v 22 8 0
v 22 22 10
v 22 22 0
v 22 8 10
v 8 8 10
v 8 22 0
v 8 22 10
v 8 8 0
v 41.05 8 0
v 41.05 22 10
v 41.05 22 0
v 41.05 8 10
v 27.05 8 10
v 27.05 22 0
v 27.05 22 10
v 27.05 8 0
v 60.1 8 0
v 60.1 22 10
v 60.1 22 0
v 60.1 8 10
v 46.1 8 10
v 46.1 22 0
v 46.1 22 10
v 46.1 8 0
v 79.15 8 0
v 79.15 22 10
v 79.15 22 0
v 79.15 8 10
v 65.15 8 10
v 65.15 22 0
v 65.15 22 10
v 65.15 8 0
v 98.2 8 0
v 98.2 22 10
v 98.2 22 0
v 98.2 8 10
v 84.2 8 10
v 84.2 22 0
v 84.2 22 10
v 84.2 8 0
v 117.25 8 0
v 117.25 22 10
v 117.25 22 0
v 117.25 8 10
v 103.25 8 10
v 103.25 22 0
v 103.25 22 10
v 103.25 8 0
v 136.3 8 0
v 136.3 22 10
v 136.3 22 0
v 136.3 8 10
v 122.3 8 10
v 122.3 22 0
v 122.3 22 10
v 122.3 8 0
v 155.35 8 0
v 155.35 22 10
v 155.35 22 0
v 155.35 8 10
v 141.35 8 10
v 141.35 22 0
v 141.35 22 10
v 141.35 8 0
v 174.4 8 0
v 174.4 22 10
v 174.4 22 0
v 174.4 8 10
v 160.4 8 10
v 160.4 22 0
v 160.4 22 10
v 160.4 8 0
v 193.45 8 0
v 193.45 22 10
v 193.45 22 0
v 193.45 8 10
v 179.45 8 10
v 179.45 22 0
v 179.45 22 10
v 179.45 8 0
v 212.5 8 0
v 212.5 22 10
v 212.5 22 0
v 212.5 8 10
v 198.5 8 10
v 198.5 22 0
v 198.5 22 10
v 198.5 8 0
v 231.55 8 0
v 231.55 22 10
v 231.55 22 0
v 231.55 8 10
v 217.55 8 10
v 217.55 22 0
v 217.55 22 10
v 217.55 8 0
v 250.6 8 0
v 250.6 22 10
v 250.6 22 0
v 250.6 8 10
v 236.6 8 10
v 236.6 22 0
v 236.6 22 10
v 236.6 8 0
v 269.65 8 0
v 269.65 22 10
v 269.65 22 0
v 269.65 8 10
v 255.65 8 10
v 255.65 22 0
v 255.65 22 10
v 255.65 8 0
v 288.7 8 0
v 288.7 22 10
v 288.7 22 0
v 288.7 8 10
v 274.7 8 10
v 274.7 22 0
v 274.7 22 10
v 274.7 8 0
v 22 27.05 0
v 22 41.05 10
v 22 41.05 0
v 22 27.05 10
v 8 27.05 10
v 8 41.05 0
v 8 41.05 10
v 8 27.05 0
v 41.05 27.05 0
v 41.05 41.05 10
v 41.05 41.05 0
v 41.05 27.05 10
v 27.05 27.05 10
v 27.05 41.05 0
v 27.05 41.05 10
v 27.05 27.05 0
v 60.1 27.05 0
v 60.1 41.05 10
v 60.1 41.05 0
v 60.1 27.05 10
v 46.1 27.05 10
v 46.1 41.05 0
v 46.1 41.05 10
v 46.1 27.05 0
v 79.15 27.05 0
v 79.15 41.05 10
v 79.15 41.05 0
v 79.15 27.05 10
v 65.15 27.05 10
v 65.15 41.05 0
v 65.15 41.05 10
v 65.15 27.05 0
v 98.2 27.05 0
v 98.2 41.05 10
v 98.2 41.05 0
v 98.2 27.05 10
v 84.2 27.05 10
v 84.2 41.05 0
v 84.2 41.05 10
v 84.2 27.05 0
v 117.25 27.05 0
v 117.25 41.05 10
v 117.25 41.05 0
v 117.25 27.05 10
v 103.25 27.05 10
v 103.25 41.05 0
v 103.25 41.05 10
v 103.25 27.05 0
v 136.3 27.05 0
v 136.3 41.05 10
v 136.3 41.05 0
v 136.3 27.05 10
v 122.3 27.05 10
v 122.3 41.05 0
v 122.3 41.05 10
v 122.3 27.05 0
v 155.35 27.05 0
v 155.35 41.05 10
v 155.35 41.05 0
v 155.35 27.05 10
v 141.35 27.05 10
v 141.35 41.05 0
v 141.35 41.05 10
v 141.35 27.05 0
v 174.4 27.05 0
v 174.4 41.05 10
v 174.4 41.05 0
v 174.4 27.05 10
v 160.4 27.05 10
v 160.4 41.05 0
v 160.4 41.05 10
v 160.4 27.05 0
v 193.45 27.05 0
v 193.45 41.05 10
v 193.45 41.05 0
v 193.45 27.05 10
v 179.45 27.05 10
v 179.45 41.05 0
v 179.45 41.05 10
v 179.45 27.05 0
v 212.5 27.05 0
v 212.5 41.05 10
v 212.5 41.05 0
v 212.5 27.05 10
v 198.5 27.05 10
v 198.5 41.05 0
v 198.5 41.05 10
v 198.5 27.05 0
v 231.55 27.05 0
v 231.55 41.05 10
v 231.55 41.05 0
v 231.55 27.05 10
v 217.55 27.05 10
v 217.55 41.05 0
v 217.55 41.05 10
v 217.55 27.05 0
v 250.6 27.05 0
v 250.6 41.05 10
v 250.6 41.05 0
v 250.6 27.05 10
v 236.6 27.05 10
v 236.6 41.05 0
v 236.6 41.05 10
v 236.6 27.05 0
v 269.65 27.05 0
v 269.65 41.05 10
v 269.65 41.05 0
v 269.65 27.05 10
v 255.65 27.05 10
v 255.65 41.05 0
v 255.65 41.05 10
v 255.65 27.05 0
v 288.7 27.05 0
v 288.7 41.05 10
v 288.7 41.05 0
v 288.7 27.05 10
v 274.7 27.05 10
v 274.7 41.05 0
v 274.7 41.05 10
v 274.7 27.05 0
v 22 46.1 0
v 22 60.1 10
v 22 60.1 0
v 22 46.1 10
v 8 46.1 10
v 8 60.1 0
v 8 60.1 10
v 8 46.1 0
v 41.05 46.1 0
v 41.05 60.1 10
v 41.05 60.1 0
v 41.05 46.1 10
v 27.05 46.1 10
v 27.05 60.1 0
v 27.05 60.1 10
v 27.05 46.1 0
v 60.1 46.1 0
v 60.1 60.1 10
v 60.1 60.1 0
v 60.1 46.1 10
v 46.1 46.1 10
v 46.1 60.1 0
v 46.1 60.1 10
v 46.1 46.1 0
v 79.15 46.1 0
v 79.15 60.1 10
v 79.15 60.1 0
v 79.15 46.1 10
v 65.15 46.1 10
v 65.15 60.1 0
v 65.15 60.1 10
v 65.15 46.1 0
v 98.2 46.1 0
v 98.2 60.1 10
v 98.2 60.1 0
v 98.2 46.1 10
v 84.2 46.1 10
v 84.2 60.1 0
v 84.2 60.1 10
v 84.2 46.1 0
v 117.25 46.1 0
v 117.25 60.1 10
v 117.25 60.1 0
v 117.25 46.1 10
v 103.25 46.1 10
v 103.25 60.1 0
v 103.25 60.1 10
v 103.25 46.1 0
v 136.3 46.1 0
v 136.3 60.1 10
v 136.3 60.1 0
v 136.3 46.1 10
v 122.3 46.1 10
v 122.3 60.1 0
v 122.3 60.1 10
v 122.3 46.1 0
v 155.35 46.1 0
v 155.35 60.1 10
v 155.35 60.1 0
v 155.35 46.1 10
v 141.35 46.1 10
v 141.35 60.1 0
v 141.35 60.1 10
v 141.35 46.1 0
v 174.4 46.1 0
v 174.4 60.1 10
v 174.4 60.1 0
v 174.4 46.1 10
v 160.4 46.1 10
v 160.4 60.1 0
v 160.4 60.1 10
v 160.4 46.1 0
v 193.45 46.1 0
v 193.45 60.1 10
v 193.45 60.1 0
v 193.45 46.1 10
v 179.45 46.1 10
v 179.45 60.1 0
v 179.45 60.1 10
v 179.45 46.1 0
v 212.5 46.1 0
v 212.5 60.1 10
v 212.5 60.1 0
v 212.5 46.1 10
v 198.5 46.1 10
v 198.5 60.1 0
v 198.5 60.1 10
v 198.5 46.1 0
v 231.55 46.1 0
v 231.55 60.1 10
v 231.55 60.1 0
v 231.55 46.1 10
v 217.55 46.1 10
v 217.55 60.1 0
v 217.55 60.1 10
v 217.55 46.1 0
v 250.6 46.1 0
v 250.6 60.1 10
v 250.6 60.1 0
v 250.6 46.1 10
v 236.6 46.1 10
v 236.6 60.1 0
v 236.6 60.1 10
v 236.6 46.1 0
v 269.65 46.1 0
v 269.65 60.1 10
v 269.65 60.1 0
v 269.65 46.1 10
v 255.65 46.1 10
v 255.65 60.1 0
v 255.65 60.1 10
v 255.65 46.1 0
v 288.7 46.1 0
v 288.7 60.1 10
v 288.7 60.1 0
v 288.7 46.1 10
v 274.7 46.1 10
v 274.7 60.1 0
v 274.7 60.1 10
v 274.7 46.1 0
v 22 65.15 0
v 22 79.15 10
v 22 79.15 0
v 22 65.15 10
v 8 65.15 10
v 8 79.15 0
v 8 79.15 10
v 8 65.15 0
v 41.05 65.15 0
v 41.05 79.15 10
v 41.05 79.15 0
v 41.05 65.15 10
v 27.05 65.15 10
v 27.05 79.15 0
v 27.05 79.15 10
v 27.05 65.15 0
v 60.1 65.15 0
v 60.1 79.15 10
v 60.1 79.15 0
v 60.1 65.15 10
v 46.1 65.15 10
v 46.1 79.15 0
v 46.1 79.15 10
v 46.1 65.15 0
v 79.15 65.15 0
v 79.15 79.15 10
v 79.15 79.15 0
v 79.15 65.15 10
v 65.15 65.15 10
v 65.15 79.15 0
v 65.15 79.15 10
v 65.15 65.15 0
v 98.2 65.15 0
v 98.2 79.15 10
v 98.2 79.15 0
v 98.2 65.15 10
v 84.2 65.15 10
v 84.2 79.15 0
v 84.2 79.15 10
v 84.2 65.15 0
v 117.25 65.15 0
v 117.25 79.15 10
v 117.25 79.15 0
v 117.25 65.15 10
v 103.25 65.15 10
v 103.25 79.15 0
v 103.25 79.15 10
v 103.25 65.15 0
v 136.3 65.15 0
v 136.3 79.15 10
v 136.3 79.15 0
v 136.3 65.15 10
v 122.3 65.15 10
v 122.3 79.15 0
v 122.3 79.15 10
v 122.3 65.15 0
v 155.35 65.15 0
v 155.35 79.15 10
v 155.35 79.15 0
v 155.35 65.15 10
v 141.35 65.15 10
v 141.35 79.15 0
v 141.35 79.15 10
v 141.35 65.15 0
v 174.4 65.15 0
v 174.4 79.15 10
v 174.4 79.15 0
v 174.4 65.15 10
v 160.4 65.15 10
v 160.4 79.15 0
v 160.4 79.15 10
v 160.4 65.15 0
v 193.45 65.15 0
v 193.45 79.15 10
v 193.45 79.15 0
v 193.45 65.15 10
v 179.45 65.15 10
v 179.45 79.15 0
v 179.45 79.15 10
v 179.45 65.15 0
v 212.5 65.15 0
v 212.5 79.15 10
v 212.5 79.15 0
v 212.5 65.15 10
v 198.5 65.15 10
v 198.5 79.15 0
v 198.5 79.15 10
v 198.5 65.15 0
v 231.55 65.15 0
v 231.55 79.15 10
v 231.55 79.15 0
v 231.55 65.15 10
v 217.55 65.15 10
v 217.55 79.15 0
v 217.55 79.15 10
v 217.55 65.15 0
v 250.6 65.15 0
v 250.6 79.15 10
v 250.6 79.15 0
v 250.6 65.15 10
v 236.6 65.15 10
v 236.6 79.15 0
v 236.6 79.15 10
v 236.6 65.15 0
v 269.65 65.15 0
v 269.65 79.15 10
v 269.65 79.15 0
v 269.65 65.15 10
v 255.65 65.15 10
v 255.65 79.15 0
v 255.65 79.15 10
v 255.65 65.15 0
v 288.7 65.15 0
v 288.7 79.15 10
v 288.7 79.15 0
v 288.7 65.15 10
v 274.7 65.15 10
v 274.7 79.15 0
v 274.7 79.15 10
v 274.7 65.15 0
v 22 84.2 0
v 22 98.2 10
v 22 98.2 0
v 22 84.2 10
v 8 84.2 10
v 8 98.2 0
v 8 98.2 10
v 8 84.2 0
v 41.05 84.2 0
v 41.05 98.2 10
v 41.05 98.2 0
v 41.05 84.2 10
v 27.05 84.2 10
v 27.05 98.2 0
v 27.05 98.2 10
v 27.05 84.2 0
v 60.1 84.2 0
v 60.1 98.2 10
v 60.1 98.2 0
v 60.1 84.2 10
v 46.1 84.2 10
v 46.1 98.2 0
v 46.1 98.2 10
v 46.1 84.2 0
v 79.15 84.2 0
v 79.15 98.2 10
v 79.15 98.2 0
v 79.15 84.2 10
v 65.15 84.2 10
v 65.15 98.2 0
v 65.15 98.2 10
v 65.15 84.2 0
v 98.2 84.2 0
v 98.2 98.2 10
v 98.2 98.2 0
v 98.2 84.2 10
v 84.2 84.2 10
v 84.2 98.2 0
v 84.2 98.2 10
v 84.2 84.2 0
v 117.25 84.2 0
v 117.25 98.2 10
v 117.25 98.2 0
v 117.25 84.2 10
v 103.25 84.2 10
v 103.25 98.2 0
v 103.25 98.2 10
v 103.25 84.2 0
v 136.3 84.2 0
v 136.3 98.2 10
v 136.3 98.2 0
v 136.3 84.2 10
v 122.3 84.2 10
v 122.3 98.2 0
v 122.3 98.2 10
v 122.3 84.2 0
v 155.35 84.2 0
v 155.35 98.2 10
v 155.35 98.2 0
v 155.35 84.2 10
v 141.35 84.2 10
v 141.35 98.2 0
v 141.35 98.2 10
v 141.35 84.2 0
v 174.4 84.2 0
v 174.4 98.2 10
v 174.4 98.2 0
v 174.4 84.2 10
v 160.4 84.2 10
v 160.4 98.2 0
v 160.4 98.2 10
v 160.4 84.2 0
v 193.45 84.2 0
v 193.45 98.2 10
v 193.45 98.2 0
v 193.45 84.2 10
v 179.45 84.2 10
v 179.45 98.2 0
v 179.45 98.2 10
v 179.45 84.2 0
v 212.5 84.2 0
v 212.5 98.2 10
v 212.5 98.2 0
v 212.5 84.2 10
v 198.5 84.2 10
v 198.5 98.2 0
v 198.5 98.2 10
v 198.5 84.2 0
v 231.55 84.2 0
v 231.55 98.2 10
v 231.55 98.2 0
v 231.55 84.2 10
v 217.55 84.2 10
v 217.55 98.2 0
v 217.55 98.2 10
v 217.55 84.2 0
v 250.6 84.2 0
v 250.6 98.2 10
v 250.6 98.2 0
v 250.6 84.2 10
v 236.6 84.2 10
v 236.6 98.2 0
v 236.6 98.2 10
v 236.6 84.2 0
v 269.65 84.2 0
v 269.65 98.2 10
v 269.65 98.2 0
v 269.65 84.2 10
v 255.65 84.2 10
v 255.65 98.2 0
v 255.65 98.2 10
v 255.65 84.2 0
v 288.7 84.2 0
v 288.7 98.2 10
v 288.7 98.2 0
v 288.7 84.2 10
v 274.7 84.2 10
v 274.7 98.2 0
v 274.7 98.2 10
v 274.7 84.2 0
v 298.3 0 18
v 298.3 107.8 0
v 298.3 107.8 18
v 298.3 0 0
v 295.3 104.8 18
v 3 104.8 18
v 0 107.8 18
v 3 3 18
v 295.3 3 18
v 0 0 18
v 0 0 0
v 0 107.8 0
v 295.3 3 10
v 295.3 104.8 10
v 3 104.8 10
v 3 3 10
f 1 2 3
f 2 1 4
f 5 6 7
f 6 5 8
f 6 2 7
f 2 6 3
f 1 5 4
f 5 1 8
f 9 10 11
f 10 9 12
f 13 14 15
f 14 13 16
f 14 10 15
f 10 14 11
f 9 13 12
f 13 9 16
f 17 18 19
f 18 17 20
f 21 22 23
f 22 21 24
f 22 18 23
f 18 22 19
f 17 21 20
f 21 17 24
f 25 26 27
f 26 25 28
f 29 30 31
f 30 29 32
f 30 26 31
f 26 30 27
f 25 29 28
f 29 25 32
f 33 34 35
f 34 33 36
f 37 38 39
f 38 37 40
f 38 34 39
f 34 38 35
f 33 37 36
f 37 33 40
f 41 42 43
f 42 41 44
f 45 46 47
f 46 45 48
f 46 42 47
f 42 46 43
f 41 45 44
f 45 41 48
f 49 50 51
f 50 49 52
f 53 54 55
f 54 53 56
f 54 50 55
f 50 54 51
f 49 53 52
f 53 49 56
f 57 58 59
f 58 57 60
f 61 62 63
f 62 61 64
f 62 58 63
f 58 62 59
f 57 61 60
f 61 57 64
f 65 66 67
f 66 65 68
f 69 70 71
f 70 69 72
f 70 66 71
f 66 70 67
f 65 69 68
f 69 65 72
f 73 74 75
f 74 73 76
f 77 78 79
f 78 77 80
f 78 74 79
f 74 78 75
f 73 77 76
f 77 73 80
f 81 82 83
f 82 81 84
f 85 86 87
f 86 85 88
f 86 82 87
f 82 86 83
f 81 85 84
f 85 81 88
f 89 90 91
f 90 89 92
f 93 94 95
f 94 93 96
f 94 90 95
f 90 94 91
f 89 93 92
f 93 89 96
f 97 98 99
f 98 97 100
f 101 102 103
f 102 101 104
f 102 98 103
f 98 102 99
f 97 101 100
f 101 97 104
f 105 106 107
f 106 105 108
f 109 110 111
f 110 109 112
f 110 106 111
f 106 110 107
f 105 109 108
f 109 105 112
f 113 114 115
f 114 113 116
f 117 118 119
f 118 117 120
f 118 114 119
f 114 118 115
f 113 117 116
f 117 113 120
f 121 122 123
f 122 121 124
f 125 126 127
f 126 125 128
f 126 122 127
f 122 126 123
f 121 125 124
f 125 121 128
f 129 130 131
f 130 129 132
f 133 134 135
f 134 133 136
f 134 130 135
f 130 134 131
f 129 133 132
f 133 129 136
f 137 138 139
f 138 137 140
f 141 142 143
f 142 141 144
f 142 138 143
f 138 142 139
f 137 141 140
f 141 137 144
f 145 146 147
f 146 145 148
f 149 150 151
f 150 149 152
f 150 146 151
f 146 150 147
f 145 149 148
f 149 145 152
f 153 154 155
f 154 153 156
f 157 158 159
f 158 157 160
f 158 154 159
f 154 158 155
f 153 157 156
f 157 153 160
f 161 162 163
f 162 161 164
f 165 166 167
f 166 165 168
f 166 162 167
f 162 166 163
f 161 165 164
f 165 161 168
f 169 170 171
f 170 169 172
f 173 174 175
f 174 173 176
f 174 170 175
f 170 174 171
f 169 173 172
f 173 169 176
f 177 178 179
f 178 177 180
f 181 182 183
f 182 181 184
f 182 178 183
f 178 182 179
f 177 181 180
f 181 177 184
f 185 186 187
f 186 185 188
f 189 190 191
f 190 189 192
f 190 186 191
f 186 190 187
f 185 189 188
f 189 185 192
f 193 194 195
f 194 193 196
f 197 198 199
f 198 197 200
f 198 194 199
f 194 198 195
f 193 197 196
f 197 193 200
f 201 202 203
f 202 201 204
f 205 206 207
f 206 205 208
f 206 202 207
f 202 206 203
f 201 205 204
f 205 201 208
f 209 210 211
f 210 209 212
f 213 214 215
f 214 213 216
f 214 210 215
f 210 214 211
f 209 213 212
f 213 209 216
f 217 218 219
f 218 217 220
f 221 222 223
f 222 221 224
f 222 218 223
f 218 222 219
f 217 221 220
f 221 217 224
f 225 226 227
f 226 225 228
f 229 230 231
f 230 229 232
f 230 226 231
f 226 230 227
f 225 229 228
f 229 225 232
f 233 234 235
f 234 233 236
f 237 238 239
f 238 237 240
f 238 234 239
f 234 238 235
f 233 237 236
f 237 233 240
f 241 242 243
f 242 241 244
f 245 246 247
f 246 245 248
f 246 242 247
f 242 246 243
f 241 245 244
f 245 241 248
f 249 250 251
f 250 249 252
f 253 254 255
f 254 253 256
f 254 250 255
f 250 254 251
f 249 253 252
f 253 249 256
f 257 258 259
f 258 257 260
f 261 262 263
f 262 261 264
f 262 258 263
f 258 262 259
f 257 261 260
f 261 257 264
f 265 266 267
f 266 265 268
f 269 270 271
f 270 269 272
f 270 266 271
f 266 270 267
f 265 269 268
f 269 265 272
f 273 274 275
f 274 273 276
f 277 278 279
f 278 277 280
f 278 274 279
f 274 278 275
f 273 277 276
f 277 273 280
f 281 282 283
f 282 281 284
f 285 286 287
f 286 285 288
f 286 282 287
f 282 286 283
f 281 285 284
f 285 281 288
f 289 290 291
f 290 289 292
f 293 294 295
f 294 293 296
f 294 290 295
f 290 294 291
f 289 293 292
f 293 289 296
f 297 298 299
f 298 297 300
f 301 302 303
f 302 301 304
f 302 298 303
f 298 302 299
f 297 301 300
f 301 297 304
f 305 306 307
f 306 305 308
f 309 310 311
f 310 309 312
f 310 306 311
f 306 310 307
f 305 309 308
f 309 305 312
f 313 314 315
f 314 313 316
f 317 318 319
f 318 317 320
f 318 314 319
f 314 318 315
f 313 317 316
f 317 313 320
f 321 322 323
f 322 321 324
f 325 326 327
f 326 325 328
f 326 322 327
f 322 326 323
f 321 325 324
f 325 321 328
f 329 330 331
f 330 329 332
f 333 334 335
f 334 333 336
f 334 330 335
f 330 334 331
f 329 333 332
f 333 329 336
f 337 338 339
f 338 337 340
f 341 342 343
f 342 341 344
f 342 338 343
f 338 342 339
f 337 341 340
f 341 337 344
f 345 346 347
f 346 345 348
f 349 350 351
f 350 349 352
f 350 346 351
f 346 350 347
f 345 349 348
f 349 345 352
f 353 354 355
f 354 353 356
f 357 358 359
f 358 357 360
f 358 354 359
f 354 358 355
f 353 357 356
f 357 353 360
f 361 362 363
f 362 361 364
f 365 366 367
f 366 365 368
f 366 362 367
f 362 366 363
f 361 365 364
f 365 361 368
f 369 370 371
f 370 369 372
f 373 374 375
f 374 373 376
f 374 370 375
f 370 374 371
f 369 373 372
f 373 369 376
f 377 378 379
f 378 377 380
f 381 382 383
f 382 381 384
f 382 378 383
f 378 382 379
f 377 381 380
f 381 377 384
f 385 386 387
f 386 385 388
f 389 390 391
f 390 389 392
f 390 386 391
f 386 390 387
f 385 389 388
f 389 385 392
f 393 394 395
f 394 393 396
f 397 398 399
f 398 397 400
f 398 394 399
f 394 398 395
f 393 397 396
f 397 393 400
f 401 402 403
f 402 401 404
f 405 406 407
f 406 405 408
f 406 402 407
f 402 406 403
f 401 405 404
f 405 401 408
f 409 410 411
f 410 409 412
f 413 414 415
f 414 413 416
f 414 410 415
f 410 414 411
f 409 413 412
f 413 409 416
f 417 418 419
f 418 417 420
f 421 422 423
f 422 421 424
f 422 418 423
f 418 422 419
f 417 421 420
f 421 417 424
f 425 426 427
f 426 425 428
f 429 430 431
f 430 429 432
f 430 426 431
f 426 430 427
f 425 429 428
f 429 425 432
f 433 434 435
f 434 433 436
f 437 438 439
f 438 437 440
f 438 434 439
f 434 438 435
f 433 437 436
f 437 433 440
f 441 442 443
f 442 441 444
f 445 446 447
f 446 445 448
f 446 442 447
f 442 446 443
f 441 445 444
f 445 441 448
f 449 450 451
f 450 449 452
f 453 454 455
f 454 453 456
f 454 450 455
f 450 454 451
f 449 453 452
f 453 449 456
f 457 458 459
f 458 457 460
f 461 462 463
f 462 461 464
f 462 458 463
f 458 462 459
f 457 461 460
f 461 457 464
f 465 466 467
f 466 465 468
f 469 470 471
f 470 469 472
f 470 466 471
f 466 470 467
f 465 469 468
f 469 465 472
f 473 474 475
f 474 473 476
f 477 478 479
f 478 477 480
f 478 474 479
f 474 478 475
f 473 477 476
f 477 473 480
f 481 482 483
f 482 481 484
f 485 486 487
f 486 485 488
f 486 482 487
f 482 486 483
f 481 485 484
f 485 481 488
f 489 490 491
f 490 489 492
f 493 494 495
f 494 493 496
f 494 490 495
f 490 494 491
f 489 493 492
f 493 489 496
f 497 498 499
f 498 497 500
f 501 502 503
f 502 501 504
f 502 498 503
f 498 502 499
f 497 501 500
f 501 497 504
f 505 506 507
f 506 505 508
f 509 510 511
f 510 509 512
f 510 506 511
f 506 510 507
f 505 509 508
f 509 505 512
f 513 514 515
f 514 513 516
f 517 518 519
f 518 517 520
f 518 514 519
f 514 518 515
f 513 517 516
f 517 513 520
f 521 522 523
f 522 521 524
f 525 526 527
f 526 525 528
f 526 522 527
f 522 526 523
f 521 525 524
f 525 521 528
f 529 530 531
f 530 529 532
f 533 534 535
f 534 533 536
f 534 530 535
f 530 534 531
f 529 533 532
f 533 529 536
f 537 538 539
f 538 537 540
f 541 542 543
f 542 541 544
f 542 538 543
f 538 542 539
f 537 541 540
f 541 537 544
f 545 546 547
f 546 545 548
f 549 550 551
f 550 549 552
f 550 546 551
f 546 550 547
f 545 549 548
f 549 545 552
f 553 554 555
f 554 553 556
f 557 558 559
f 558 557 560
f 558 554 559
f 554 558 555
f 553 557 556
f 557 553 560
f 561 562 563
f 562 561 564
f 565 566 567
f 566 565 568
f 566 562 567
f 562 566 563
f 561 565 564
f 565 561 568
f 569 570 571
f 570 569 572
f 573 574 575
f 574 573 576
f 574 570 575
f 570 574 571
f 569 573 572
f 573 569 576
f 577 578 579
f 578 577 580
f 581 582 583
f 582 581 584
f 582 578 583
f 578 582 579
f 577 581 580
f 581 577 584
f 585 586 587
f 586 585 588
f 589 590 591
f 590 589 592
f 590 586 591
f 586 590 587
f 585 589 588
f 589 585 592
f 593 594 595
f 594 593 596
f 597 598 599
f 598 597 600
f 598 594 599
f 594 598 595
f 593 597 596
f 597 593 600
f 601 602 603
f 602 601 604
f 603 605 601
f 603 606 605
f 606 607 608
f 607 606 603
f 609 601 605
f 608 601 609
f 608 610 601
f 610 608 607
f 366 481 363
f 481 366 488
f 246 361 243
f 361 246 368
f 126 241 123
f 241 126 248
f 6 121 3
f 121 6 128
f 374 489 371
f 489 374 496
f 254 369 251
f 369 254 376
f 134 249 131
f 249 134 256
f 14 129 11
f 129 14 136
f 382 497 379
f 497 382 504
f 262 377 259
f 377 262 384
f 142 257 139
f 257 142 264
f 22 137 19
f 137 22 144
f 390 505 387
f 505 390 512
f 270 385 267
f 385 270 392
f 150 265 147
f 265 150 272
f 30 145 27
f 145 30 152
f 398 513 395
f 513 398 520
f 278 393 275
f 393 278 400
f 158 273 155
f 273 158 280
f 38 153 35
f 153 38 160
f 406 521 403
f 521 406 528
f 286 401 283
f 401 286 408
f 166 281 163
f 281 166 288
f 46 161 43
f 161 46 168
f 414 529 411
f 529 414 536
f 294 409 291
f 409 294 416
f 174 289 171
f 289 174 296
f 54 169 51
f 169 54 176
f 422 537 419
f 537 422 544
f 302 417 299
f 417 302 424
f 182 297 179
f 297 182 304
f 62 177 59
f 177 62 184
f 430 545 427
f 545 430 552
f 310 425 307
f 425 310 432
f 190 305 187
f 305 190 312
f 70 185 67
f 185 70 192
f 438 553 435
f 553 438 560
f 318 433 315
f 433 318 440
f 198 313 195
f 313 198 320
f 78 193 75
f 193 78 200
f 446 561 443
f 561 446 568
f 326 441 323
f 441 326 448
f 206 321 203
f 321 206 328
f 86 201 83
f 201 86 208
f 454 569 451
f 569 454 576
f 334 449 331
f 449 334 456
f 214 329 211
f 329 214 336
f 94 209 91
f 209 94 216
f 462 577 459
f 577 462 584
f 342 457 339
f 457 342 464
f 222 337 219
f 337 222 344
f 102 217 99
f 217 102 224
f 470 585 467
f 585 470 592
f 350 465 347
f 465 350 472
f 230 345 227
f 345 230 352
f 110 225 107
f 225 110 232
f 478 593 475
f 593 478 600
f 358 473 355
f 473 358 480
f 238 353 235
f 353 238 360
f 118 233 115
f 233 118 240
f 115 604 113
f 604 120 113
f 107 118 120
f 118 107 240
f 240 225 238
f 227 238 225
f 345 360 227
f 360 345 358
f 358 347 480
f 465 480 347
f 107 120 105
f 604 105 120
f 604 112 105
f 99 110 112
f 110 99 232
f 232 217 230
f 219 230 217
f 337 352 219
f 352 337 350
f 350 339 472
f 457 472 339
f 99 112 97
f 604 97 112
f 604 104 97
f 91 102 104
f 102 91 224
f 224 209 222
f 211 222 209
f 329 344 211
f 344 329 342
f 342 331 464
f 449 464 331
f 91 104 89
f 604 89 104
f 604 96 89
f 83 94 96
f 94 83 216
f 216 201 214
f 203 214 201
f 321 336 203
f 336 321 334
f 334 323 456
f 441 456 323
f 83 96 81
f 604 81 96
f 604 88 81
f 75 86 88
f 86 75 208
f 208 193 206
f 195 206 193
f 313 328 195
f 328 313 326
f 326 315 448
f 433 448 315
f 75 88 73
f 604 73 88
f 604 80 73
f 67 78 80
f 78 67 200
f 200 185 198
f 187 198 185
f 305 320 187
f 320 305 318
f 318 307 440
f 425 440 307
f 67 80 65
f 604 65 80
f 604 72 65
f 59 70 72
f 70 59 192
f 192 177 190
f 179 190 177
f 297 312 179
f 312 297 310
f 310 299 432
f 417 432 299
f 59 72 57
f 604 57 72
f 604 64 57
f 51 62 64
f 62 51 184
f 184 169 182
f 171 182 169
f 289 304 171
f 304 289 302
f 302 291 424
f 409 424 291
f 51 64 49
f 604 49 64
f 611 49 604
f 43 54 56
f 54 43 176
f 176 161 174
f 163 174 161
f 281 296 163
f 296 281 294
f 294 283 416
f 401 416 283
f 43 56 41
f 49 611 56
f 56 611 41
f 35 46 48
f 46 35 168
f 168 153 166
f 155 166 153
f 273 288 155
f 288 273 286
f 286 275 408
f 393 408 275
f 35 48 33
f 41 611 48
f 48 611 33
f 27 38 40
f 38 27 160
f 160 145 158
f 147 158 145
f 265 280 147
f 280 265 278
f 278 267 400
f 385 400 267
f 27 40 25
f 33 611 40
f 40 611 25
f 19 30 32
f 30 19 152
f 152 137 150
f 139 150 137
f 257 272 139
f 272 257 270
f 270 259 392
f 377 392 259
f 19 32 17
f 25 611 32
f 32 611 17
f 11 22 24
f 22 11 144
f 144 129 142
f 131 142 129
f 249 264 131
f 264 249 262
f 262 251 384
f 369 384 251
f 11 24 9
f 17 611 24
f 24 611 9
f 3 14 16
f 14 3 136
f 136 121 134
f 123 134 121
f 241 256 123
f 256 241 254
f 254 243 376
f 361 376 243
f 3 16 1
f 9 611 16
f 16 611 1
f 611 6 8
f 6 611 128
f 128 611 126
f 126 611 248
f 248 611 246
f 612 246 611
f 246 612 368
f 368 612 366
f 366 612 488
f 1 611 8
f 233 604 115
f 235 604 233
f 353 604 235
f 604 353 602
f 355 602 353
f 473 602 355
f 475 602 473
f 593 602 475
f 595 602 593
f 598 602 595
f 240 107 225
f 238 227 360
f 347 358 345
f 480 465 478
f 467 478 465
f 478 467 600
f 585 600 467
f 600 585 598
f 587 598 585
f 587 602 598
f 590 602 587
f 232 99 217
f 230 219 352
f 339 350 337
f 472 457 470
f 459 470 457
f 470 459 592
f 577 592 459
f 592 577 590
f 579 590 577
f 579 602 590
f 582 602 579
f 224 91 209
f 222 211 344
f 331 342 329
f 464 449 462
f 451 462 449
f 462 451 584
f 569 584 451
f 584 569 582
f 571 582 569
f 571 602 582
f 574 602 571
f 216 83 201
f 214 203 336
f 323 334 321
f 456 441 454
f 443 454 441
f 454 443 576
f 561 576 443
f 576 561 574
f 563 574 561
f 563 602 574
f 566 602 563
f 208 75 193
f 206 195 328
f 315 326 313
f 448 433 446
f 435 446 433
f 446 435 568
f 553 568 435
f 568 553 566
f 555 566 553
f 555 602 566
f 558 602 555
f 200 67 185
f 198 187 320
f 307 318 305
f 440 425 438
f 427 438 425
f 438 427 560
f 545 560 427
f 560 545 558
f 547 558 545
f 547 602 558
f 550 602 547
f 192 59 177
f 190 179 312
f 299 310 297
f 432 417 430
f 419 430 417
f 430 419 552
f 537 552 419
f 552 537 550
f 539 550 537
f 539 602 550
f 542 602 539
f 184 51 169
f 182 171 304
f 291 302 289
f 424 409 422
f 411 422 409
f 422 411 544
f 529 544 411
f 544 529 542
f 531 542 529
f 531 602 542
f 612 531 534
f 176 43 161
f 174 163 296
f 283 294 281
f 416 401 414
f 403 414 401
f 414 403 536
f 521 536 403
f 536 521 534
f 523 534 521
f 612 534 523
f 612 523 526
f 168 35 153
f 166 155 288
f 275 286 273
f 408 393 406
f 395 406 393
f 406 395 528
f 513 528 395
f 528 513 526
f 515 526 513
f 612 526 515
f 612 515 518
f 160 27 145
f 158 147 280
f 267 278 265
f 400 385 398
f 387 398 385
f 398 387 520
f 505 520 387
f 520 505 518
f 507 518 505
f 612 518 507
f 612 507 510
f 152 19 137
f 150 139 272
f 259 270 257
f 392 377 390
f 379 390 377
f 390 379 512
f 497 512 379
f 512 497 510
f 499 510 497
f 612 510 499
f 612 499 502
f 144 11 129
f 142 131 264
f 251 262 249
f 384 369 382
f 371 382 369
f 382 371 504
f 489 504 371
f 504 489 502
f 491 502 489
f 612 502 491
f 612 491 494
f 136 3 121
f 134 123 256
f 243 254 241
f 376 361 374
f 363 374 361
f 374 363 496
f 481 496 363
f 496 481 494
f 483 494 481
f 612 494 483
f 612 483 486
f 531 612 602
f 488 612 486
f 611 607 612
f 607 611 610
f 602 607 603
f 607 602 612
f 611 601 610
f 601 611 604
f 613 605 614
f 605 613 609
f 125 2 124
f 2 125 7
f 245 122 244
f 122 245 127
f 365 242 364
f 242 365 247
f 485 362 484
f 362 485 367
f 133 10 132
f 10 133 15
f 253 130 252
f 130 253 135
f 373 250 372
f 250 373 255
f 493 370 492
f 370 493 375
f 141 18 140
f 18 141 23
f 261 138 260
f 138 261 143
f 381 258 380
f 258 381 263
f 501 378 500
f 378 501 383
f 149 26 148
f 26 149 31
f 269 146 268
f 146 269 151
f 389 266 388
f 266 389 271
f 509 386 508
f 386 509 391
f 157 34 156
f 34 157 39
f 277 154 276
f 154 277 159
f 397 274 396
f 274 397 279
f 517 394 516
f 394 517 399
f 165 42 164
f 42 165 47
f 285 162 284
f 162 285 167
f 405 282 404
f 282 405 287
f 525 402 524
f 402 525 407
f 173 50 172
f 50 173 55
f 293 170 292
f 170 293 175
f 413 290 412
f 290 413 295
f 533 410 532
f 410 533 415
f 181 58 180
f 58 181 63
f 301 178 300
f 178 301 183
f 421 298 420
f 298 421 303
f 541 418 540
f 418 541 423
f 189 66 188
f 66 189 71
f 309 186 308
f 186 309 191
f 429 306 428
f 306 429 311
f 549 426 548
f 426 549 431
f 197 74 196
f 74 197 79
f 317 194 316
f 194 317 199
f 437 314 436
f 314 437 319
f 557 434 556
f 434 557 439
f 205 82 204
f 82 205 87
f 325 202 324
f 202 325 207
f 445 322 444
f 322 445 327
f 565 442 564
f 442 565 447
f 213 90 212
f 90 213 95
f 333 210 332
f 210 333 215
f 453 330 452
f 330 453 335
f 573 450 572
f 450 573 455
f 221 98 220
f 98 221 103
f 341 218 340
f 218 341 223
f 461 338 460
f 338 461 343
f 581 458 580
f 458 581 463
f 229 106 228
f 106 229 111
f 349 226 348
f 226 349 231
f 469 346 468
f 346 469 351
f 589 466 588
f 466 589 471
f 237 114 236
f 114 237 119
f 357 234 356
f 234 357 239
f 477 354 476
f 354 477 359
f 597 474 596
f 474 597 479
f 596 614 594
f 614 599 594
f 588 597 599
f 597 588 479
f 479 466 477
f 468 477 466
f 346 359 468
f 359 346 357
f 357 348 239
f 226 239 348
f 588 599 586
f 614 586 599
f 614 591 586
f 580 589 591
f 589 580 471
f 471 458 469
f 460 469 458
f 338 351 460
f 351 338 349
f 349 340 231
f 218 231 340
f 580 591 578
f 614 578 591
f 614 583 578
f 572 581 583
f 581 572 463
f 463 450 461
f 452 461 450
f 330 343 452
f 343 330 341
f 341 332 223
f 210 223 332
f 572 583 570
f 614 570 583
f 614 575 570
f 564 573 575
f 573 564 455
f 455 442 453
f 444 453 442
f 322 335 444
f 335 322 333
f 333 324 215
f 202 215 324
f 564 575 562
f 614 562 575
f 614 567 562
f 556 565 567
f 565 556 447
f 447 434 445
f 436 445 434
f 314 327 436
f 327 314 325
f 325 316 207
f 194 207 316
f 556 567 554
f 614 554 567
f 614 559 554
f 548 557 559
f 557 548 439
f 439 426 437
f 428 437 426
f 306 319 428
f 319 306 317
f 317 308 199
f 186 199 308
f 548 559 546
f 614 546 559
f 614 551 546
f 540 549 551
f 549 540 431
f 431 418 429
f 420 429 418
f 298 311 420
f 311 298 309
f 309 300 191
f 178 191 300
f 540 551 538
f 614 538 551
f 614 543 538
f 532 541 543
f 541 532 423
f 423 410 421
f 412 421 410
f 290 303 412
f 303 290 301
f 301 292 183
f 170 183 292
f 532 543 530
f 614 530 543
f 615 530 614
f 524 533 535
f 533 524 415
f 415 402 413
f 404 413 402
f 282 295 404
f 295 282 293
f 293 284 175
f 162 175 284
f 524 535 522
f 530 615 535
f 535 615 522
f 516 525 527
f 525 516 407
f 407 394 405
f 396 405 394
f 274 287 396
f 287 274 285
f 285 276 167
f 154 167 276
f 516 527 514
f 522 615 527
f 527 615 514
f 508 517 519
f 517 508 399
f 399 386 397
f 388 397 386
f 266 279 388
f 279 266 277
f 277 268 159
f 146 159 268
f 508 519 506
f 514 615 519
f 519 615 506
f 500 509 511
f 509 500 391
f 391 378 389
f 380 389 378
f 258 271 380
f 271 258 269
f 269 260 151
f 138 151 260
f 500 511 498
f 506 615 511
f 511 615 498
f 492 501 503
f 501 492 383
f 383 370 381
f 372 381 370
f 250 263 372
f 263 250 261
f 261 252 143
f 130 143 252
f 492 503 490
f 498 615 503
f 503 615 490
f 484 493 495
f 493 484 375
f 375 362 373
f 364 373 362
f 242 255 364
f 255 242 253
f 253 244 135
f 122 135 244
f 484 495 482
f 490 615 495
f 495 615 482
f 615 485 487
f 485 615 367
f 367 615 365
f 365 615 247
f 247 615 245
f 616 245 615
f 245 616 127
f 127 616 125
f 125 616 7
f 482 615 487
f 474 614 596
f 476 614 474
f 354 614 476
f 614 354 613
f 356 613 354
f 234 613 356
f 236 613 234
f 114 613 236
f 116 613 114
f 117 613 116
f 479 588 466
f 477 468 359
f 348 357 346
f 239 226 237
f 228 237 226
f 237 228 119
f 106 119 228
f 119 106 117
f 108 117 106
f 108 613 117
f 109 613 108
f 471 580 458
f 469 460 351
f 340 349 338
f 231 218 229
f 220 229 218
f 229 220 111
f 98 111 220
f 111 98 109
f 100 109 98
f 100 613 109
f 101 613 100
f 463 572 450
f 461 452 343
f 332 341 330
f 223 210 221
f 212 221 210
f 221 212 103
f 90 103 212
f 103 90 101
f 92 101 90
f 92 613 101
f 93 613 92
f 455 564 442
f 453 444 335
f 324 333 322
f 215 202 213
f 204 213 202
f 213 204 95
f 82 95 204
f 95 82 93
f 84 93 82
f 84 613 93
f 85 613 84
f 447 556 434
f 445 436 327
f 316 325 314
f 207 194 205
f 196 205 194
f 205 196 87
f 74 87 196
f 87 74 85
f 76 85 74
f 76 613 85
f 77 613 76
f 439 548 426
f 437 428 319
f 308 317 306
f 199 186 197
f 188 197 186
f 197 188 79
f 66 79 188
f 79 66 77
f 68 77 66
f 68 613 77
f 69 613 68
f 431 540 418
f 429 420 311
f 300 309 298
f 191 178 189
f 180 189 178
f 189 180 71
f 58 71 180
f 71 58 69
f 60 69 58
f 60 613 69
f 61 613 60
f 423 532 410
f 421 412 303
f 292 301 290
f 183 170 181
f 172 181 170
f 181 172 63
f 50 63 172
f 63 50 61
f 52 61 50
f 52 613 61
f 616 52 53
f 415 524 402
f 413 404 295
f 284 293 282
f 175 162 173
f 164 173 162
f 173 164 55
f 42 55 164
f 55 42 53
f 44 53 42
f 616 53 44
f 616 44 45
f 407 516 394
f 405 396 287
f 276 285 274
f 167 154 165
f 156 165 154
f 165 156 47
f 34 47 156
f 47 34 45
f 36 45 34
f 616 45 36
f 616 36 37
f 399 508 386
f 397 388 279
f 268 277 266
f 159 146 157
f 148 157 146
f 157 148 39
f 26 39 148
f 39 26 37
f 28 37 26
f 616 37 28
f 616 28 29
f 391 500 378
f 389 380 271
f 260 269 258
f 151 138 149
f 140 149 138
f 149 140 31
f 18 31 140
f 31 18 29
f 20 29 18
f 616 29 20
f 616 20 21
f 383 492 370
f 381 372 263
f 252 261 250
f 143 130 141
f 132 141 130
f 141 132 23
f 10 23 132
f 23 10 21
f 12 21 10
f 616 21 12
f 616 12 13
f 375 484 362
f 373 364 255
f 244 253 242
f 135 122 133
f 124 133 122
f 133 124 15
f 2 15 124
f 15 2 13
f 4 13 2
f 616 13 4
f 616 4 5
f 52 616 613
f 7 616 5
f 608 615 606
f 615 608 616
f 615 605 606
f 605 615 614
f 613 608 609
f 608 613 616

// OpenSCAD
// Generated keyboard case
// Layout: 5x15
// Switch type: Cherry MX

// Parameters
case_width = 298.30;
case_height = 107.80;
case_depth = 18.00;
wall_thickness = 3.00;
base_height = 10.00;
switch_cutout_size = 14.00;
key_spacing = 19.05;

module keyboard_case() {
    difference() {
        // Outer shell
        translate([0, 0, 0])
            cube([case_width, case_height, case_depth]);

        // Inner cavity
        translate([wall_thickness, wall_thickness, base_height])
            cube([case_width - 2*wall_thickness, 
                  case_height - 2*wall_thickness, 
                  case_depth - base_height + 1]);

        // Switch cutouts
        translate([wall_thickness + 5 - 0.00, wall_thickness + 5 - 0.00, -1])
            switch_plate();
    }
}

module switch_plate() {
    translate([0.00, 0.00, 0])
        cube([switch_cutout_size, switch_cutout_size, base_height + 2]);
    translate([19.05, 0.00, 0])
        cube([switch_cutout_size, switch_cutout_size, base_height + 2]);
    translate([38.10, 0.00, 0])
        cube([switch_cutout_size, switch_cutout_size, base_height + 2]);
    translate([57.15, 0.00, 0])
        cube([switch_cutout_size, switch_cutout_size, base_height + 2]);
    translate([76.20, 0.00, 0])
        cube([switch_cutout_size, switch_cutout_size, base_height + 2]);
    translate([95.25, 0.00, 0])
        cube([switch_cutout_size, switch_cutout_size, base_height + 2]);
    translate([114.30, 0.00, 0])
        cube([switch_cutout_size, switch_cutout_size, base_height + 2]);
    translate([133.35, 0.00, 0])
        cube([switch_cutout_size, switch_cutout_size, base_height + 2]);
    translate([152.40, 0.00, 0])
        cube([switch_cutout_size, switch_cutout_size, base_height + 2]);
    translate([171.45, 0.00, 0])
        cube([switch_cutout_size, switch_cutout_size, base_height + 2]);
    translate([190.50, 0.00, 0])
        cube([switch_cutout_size, switch_cutout_size, base_height + 2]);
    translate([209.55, 0.00, 0])
        cube([switch_cutout_size, switch_cutout_size, base_height + 2]);
    translate([228.60, 0.00, 0])
        cube([switch_cutout_size, switch_cutout_size, base_height + 2]);
    translate([247.65, 0.00, 0])
        cube([switch_cutout_size, switch_cutout_size, base_height + 2]);
    translate([266.70, 0.00, 0])
        cube([switch_cutout_size, switch_cutout_size, base_height + 2]);
    translate([0.00, 19.05, 0])
        cube([switch_cutout_size, switch_cutout_size, base_height + 2]);
    translate([19.05, 19.05, 0])
        cube([switch_cutout_size, switch_cutout_size, base_height + 2]);
    translate([38.10, 19.05, 0])
        cube([switch_cutout_size, switch_cutout_size, base_height + 2]);
    translate([57.15, 19.05, 0])
        cube([switch_cutout_size, switch_cutout_size, base_height + 2]);
    translate([76.20, 19.05, 0])
        cube([switch_cutout_size, switch_cutout_size, base_height + 2]);
    translate([95.25, 19.05, 0])
        cube([switch_cutout_size, switch_cutout_size, base_height + 2]);
    translate([114.30, 19.05, 0])
        cube([switch_cutout_size, switch_cutout_size, base_height + 2]);
    translate([133.35, 19.05, 0])
        cube([switch_cutout_size, switch_cutout_size, base_height + 2]);
    translate([152.40, 19.05, 0])
        cube([switch_cutout_size, switch_cutout_size, base_height + 2]);
    translate([171.45, 19.05, 0])
        cube([switch_cutout_size, switch_cutout_size, base_height + 2]);
    translate([190.50, 19.05, 0])
        cube([switch_cutout_size, switch_cutout_size, base_height + 2]);
    translate([209.55, 19.05, 0])
        cube([switch_cutout_size, switch_cutout_size, base_height + 2]);
    translate([228.60, 19.05, 0])
        cube([switch_cutout_size, switch_cutout_size, base_height + 2]);
    translate([247.65, 19.05, 0])
        cube([switch_cutout_size, switch_cutout_size, base_height + 2]);
    translate([266.70, 19.05, 0])
        cube([switch_cutout_size, switch_cutout_size, base_height + 2]);
    translate([0.00, 38.10, 0])
        cube([switch_cutout_size, switch_cutout_size, base_height + 2]);
    translate([19.05, 38.10, 0])
        cube([switch_cutout_size, switch_cutout_size, base_height + 2]);
    translate([38.10, 38.10, 0])
        cube([switch_cutout_size, switch_cutout_size, base_height + 2]);
    translate([57.15, 38.10, 0])
        cube([switch_cutout_size, switch_cutout_size, base_height + 2]);
    translate([76.20, 38.10, 0])
        cube([switch_cutout_size, switch_cutout_size, base_height + 2]);
    translate([95.25, 38.10, 0])
        cube([switch_cutout_size, switch_cutout_size, base_height + 2]);
    translate([114.30, 38.10, 0])
        cube([switch_cutout_size, switch_cutout_size, base_height + 2]);
    translate([133.35, 38.10, 0])
        cube([switch_cutout_size, switch_cutout_size, base_height + 2]);
    translate([152.40, 38.10, 0])
        cube([switch_cutout_size, switch_cutout_size, base_height + 2]);
    translate([171.45, 38.10, 0])
        cube([switch_cutout_size, switch_cutout_size, base_height + 2]);
    translate([190.50, 38.10, 0])
        cube([switch_cutout_size, switch_cutout_size, base_height + 2]);
    translate([209.55, 38.10, 0])
        cube([switch_cutout_size, switch_cutout_size, base_height + 2]);
    translate([228.60, 38.10, 0])
        cube([switch_cutout_size, switch_cutout_size, base_height + 2]);
    translate([247.65, 38.10, 0])
        cube([switch_cutout_size, switch_cutout_size, base_height + 2]);
    translate([266.70, 38.10, 0])
        cube([switch_cutout_size, switch_cutout_size, base_height + 2]);
    translate([0.00, 57.15, 0])
        cube([switch_cutout_size, switch_cutout_size, base_height + 2]);
    translate([19.05, 57.15, 0])
        cube([switch_cutout_size, switch_cutout_size, base_height + 2]);
    translate([38.10, 57.15, 0])
        cube([switch_cutout_size, switch_cutout_size, base_height + 2]);
    translate([57.15, 57.15, 0])
        cube([switch_cutout_size, switch_cutout_size, base_height + 2]);
    translate([76.20, 57.15, 0])
        cube([switch_cutout_size, switch_cutout_size, base_height + 2]);
    translate([95.25, 57.15, 0])
        cube([switch_cutout_size, switch_cutout_size, base_height + 2]);
    translate([114.30, 57.15, 0])
        cube([switch_cutout_size, switch_cutout_size, base_height + 2]);
    translate([133.35, 57.15, 0])
        cube([switch_cutout_size, switch_cutout_size, base_height + 2]);
    translate([152.40, 57.15, 0])
        cube([switch_cutout_size, switch_cutout_size, base_height + 2]);
    translate([171.45, 57.15, 0])
        cube([switch_cutout_size, switch_cutout_size, base_height + 2]);
    translate([190.50, 57.15, 0])
        cube([switch_cutout_size, switch_cutout_size, base_height + 2]);
    translate([209.55, 57.15, 0])
        cube([switch_cutout_size, switch_cutout_size, base_height + 2]);
    translate([228.60, 57.15, 0])
        cube([switch_cutout_size, switch_cutout_size, base_height + 2]);
    translate([247.65, 57.15, 0])
        cube([switch_cutout_size, switch_cutout_size, base_height + 2]);
    translate([266.70, 57.15, 0])
        cube([switch_cutout_size, switch_cutout_size, base_height + 2]);
    translate([0.00, 76.20, 0])
        cube([switch_cutout_size, switch_cutout_size, base_height + 2]);
    translate([19.05, 76.20, 0])
        cube([switch_cutout_size, switch_cutout_size, base_height + 2]);
    translate([38.10, 76.20, 0])
        cube([switch_cutout_size, switch_cutout_size, base_height + 2]);
    translate([57.15, 76.20, 0])
        cube([switch_cutout_size, switch_cutout_size, base_height + 2]);
    translate([76.20, 76.20, 0])
        cube([switch_cutout_size, switch_cutout_size, base_height + 2]);
    translate([95.25, 76.20, 0])
        cube([switch_cutout_size, switch_cutout_size, base_height + 2]);
    translate([114.30, 76.20, 0])
        cube([switch_cutout_size, switch_cutout_size, base_height + 2]);
    translate([133.35, 76.20, 0])
        cube([switch_cutout_size, switch_cutout_size, base_height + 2]);
    translate([152.40, 76.20, 0])
        cube([switch_cutout_size, switch_cutout_size, base_height + 2]);
    translate([171.45, 76.20, 0])
        cube([switch_cutout_size, switch_cutout_size, base_height + 2]);
    translate([190.50, 76.20, 0])
        cube([switch_cutout_size, switch_cutout_size, base_height + 2]);
    translate([209.55, 76.20, 0])
        cube([switch_cutout_size, switch_cutout_size, base_height + 2]);
    translate([228.60, 76.20, 0])
        cube([switch_cutout_size, switch_cutout_size, base_height + 2]);
    translate([247.65, 76.20, 0])
        cube([switch_cutout_size, switch_cutout_size, base_height + 2]);
    translate([266.70, 76.20, 0])
        cube([switch_cutout_size, switch_cutout_size, base_height + 2]);
}

// Generate the case
keyboard_case();
